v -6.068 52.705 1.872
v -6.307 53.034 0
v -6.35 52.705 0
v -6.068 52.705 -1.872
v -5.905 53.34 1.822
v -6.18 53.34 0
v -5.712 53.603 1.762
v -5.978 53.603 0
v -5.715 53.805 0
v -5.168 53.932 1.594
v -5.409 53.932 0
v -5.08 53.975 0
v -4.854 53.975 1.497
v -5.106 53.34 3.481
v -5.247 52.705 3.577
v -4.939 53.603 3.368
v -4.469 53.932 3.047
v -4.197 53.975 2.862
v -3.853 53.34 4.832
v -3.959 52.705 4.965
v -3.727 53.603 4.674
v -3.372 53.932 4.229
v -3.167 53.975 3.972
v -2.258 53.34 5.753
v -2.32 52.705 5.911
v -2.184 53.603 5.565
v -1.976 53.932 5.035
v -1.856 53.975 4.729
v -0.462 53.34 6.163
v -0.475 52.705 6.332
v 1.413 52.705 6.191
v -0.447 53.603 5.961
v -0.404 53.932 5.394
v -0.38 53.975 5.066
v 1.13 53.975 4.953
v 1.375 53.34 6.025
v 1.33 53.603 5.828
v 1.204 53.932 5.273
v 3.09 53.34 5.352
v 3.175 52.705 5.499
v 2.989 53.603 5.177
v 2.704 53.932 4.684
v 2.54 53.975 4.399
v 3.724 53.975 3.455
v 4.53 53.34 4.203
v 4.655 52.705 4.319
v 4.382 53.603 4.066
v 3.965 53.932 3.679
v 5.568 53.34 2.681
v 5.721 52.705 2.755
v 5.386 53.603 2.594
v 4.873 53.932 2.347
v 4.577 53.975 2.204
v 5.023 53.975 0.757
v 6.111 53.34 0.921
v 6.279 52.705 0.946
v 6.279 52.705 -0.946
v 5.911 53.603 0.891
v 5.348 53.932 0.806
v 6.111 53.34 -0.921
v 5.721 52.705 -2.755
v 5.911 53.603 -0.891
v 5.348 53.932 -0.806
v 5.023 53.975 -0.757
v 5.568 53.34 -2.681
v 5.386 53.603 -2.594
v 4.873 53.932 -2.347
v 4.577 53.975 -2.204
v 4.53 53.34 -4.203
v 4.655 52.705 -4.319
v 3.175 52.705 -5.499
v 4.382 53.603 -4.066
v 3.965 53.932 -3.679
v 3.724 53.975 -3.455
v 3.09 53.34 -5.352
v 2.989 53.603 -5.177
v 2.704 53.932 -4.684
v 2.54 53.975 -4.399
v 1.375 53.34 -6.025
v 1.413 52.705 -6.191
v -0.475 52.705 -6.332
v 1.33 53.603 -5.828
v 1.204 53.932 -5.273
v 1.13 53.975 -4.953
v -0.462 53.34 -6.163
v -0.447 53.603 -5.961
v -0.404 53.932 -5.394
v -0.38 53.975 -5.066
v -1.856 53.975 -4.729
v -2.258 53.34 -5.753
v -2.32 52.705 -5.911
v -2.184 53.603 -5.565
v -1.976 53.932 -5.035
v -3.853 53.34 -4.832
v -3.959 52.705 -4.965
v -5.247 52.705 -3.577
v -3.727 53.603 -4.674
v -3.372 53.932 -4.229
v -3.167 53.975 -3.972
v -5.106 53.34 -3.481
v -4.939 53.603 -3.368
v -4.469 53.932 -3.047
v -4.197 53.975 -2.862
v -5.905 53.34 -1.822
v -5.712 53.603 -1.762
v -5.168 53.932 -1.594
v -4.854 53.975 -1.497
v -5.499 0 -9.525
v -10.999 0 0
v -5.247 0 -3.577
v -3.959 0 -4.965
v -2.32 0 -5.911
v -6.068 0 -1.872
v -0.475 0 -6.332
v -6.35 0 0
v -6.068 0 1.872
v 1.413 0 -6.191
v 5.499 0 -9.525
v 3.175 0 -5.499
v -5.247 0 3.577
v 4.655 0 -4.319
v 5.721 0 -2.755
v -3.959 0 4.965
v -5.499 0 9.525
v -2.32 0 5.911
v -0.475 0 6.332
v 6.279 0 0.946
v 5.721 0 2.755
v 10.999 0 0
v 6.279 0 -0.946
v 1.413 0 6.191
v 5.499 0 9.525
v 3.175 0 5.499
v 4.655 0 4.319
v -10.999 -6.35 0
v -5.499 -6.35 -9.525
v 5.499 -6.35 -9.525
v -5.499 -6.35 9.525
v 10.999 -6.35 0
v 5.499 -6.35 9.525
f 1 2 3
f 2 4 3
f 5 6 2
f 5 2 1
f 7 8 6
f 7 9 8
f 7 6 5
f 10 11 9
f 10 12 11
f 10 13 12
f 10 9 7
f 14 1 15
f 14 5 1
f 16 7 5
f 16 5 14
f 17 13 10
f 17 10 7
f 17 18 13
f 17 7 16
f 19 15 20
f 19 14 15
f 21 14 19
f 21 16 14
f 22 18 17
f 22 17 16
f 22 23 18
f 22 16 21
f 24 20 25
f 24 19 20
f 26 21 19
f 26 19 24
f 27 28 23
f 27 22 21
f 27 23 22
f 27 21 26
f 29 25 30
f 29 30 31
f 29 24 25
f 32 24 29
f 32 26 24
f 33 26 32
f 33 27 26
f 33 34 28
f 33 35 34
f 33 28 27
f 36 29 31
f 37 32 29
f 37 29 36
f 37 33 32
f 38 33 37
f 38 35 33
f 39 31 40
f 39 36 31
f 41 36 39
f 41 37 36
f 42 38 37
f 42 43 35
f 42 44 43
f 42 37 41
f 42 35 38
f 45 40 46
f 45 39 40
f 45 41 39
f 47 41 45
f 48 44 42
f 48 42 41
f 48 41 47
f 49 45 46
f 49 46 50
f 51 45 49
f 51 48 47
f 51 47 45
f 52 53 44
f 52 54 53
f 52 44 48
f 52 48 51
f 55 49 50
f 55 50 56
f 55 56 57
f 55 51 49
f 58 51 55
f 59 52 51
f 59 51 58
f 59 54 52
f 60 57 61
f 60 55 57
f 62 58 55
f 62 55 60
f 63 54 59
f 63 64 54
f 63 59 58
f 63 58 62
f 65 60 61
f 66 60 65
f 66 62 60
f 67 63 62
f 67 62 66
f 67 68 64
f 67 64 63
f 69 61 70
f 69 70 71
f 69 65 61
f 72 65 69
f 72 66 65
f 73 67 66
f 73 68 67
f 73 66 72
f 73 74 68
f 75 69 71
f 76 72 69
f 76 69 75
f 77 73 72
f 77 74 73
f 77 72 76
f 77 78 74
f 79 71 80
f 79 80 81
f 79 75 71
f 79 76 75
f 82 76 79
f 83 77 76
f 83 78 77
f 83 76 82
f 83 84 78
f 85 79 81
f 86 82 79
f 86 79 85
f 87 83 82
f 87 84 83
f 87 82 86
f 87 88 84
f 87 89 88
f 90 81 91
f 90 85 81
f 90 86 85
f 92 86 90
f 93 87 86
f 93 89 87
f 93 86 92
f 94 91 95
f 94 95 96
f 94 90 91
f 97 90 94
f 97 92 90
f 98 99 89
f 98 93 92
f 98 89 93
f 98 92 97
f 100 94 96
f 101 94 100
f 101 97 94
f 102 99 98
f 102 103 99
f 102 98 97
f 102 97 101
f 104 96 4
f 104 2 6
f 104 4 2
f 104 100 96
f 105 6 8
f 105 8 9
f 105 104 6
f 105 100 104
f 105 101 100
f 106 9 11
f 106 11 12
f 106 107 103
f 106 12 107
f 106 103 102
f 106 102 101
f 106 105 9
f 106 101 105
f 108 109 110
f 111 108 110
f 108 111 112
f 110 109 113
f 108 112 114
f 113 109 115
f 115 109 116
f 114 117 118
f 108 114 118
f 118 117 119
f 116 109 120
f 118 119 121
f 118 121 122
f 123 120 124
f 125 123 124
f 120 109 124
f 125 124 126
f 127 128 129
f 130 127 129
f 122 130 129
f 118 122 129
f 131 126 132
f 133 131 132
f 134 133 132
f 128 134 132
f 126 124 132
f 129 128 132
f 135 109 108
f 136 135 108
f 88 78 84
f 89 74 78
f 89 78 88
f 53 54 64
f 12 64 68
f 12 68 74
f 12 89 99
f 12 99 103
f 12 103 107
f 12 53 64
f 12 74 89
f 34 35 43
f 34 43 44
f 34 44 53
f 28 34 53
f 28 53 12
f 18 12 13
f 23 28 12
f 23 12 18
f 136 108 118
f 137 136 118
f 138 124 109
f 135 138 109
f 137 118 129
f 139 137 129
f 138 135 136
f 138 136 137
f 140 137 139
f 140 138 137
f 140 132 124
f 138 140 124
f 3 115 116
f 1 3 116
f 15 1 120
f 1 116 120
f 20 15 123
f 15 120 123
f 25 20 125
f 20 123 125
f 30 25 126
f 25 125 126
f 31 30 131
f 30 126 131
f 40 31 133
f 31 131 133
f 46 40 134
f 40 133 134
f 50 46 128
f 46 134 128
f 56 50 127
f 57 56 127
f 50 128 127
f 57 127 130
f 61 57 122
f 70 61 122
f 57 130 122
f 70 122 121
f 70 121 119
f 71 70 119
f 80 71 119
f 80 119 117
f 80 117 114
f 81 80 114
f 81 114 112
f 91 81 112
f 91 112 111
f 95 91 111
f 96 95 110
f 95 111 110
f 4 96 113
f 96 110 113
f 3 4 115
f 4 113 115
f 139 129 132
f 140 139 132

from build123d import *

# Parameters (mm, degrees)
F1_DEPTH = 6.35
F2_R     = 6.35
F3_DEPTH = 53.975
F4_R     = 1.27


with BuildPart() as f1:
    # F0 (on Front) → F1 (new body)
    with BuildSketch(Plane.XZ):
        Polygon((-5.499261, 9.525), (-10.998523, 0), (-5.499261, -9.525), (5.499261, -9.525), (10.998523, 0), (5.499261, 9.525), align=None)
    extrude(amount=F1_DEPTH)

    # F2 (on face) → F3 (join)
    with BuildSketch(Plane(origin=(0, 0, 0), x_dir=(-1, 0, 0), z_dir=(0, 1, 0))):
        Circle(F2_R)
    extrude(amount=F3_DEPTH)

    # F4
    f4_edges = [f1.edges().sort_by_distance(p)[0] for p in [
        (6.35, 53.975, 0),
    ]]
    fillet(f4_edges, radius=F4_R)


solid = f1.part
